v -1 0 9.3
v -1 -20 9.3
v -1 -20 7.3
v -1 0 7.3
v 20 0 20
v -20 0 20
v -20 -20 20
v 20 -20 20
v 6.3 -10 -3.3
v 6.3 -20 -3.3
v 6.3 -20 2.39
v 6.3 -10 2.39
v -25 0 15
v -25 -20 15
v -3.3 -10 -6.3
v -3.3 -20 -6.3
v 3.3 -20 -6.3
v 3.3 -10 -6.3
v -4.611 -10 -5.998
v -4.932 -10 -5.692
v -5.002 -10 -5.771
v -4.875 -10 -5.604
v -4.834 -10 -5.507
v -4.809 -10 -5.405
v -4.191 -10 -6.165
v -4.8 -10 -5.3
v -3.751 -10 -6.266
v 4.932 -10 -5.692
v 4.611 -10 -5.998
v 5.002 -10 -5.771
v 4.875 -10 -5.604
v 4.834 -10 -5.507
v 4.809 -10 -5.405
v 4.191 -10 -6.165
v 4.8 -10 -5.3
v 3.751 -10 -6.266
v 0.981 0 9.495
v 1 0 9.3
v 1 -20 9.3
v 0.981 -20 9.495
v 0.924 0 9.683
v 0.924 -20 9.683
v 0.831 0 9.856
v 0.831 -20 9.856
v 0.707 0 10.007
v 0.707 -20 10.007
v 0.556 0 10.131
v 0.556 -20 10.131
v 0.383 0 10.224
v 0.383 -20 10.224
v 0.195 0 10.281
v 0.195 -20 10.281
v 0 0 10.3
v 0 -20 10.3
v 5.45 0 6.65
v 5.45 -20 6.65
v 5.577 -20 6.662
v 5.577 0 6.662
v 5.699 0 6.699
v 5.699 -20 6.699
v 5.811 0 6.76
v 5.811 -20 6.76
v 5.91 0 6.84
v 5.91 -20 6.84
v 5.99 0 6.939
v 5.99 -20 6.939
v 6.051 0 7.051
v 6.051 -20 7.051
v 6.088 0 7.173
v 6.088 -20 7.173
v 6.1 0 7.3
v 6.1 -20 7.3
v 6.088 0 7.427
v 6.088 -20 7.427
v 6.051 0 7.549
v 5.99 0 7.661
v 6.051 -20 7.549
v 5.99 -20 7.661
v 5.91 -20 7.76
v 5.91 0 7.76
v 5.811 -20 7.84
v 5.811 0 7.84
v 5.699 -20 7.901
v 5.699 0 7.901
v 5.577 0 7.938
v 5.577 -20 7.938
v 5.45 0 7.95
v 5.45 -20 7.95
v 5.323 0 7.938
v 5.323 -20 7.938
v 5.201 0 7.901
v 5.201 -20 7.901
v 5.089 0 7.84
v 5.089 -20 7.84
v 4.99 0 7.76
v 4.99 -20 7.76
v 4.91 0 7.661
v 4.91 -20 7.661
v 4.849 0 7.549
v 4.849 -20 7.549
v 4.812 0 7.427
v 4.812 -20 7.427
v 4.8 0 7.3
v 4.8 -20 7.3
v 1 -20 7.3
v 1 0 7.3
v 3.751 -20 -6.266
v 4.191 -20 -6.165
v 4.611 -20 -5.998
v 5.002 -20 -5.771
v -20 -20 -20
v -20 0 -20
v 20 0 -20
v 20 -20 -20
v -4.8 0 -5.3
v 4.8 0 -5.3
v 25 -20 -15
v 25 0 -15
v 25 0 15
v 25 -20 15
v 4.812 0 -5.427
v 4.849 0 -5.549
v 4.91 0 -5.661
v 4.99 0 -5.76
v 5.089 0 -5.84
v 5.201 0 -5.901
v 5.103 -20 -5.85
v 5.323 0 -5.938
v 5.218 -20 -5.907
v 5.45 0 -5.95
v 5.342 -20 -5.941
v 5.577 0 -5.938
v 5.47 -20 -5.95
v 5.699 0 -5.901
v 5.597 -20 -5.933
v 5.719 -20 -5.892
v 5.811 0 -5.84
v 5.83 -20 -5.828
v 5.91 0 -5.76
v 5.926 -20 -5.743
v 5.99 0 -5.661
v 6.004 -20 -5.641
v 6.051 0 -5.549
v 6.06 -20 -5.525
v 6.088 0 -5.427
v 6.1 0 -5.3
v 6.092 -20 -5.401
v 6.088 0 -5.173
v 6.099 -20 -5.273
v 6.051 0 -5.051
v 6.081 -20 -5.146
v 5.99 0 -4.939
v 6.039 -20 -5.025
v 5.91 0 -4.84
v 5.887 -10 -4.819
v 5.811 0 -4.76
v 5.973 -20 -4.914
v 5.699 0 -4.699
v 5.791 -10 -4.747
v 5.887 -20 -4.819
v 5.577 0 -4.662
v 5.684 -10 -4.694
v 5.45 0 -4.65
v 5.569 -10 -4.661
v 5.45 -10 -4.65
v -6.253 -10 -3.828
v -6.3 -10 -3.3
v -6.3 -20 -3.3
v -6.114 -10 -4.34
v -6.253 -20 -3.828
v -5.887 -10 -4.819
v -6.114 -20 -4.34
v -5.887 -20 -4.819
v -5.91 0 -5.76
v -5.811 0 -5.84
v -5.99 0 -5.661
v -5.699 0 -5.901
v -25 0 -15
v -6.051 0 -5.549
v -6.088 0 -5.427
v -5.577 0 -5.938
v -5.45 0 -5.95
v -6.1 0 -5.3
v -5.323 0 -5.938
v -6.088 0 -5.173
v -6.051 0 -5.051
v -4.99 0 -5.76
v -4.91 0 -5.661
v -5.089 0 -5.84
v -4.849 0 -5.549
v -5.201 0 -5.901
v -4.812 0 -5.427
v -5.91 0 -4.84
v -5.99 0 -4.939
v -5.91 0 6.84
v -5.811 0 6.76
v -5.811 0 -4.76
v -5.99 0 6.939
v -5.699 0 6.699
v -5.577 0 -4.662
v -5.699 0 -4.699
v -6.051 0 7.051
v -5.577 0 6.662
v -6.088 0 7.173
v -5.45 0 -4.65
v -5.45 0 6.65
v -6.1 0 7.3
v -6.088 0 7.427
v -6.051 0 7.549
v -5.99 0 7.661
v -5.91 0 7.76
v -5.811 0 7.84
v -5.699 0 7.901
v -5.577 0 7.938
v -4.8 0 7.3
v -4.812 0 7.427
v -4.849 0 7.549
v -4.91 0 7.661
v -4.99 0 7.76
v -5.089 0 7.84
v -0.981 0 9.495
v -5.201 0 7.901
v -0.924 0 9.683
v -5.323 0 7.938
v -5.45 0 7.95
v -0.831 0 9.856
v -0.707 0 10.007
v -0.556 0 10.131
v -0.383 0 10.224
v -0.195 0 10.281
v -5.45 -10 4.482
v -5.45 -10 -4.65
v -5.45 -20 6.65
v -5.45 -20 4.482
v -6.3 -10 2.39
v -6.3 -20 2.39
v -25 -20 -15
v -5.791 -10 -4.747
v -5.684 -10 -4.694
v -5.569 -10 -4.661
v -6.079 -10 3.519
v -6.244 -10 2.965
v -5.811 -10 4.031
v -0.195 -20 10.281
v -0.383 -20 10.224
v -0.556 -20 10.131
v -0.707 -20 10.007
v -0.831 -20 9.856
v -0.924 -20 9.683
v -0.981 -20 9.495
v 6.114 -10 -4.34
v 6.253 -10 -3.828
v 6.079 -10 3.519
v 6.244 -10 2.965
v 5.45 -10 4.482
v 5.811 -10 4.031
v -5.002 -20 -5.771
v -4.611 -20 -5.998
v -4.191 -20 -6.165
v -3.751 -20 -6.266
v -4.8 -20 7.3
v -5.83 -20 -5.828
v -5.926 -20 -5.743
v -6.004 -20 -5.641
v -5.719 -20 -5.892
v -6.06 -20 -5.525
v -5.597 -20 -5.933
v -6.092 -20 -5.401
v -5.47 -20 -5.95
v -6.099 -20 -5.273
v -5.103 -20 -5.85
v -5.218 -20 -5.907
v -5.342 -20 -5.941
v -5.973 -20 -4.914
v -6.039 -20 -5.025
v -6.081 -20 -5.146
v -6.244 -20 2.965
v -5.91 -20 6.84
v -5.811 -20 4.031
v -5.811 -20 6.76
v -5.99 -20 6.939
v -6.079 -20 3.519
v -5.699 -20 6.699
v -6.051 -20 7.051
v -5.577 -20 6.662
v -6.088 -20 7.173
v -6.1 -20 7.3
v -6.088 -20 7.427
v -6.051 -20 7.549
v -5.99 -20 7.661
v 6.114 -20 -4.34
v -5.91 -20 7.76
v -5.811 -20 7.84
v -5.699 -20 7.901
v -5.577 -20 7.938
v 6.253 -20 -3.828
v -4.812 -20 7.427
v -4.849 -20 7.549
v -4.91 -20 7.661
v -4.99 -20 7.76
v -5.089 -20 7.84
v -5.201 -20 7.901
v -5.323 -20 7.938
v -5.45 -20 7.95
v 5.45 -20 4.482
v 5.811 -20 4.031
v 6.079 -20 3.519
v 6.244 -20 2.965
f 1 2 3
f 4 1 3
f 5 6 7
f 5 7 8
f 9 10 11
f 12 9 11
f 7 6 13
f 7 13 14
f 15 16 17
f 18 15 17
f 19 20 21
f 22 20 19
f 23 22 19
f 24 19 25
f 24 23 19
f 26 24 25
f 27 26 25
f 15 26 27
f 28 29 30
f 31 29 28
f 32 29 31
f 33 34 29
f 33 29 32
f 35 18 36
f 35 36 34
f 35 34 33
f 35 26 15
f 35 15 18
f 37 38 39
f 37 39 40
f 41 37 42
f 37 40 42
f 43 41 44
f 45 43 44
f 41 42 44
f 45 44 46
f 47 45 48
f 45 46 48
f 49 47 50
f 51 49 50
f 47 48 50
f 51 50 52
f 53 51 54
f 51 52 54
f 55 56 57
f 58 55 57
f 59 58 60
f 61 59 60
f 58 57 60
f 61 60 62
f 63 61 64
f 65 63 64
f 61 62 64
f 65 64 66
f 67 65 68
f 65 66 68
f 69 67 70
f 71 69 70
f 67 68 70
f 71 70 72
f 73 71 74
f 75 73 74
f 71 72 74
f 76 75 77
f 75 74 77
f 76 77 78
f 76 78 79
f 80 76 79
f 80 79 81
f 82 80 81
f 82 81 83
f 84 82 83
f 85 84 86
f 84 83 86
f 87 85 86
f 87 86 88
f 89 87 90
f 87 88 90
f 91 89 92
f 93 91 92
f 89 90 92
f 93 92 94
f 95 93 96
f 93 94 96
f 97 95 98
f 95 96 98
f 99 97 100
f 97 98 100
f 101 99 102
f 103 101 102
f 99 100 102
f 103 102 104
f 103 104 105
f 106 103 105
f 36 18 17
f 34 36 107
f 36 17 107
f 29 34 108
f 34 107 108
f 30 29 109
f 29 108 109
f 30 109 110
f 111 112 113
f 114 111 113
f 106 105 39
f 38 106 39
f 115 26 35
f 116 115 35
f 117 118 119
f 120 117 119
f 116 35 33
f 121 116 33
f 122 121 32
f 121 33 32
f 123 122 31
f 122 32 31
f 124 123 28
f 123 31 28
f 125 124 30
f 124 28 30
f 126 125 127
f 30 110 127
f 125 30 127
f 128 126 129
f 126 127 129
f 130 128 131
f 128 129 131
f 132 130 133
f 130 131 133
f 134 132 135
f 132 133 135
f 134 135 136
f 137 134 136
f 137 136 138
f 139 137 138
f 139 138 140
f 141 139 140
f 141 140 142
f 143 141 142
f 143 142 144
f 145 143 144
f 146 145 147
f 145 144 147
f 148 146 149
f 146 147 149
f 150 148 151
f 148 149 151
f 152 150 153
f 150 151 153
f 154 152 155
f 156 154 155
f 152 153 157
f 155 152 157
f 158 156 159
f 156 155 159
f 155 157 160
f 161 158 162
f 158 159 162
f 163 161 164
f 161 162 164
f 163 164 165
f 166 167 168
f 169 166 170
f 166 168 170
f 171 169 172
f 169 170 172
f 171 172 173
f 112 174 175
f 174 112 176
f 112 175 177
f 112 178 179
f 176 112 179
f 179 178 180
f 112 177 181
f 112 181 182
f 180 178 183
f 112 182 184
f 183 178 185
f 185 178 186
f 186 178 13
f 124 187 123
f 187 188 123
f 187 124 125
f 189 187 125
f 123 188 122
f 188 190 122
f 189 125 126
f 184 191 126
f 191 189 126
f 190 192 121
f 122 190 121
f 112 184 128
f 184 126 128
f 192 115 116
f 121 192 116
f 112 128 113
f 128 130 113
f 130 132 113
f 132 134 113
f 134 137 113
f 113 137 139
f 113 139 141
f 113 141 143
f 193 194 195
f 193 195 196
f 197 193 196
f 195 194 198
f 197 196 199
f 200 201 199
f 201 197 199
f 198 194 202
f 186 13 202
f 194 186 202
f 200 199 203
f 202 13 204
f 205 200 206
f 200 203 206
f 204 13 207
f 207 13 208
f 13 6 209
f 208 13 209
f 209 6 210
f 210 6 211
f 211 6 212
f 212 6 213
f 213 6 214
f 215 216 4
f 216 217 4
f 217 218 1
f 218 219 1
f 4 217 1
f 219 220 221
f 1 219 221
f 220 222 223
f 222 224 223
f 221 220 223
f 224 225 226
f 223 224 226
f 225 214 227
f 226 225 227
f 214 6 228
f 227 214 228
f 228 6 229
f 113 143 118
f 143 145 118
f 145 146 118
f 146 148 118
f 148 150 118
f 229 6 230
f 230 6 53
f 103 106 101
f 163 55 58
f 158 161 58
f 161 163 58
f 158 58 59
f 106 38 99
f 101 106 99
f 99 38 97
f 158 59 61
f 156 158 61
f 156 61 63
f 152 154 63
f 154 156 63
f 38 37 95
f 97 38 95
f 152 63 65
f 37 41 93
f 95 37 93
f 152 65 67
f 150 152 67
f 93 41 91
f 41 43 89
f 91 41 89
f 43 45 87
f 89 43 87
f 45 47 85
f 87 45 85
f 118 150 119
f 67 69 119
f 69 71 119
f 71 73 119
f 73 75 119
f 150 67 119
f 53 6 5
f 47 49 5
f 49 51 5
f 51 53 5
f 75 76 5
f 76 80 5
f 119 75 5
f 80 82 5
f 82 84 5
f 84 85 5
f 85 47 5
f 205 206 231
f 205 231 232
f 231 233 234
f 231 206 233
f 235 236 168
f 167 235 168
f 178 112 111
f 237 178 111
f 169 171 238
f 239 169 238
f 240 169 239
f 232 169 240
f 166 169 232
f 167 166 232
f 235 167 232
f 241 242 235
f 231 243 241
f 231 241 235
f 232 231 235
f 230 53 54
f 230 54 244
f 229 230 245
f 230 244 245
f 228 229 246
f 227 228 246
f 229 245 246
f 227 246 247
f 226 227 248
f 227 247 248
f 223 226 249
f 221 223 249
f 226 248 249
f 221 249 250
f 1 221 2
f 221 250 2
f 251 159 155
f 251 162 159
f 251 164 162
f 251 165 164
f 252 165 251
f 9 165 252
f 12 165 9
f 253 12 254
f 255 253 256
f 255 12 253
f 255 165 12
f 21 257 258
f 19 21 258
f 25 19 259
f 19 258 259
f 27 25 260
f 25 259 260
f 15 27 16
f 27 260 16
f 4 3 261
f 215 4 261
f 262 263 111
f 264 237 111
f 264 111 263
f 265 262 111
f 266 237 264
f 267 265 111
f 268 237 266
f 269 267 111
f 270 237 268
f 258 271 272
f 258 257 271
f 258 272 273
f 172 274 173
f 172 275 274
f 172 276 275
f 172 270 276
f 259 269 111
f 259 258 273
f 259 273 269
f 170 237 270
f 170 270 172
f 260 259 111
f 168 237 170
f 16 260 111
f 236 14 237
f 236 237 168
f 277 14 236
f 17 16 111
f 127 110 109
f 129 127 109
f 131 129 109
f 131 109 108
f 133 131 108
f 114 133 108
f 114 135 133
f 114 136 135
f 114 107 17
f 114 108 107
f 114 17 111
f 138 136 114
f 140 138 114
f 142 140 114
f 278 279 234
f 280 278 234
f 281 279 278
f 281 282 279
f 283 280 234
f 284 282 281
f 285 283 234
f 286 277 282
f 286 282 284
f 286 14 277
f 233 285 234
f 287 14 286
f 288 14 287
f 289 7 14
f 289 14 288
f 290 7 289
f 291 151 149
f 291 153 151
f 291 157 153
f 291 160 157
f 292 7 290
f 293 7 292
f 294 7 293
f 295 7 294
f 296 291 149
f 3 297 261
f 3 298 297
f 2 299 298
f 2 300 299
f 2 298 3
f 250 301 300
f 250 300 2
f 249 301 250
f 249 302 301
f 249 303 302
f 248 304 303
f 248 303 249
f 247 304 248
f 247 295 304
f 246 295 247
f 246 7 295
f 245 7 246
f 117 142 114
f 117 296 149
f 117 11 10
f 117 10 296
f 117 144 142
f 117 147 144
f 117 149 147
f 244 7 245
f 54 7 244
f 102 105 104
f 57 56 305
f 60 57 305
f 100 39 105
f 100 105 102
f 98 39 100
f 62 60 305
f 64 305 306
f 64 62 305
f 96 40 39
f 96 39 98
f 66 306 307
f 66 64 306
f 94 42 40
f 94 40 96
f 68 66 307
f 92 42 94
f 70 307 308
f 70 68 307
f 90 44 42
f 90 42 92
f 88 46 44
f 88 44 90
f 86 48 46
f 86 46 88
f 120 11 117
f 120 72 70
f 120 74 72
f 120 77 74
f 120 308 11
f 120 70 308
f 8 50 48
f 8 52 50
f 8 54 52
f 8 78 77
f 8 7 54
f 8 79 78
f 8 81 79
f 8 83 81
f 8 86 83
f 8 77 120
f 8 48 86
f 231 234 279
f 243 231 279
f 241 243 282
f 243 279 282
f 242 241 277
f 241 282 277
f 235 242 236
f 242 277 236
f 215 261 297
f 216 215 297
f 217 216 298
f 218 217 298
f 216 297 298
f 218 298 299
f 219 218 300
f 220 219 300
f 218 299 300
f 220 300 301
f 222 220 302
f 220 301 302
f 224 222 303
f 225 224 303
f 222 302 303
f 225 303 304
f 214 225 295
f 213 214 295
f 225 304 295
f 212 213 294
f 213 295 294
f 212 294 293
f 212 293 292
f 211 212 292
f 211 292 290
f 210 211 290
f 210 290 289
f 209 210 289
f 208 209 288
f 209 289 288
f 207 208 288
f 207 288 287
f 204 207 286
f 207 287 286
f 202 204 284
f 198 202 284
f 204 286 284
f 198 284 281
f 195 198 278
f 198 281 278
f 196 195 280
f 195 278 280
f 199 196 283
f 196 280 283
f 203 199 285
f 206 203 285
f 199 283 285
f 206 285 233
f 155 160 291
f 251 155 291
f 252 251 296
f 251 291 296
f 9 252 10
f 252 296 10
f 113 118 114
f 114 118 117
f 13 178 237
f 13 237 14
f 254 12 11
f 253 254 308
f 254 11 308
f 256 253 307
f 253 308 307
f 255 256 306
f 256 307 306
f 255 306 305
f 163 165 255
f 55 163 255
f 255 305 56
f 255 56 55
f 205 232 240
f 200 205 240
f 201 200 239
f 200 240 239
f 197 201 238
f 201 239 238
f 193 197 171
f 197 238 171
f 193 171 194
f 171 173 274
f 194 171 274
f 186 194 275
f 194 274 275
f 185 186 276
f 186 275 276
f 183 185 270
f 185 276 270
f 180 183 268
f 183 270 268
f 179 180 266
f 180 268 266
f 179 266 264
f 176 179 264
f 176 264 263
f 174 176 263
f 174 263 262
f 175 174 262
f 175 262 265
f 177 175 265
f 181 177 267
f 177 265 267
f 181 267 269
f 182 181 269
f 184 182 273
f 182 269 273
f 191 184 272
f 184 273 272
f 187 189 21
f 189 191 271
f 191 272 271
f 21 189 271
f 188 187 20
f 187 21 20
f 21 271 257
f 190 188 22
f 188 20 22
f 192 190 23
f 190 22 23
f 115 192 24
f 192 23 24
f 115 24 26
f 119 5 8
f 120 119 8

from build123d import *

# Parameters (mm, degrees)
F0_W     = 50
F0_H     = 40
F1_DEPTH = 20
F2_SIZE  = 5
F4_DEPTH = 20
F6_DEPTH = 10


with BuildPart() as f1:
    # F0 (on Front) → F1 (new body)
    with BuildSketch(Plane.XZ):
        Rectangle(F0_W, F0_H)
    extrude(amount=F1_DEPTH)

    # F2
    f2_edges = [f1.edges().sort_by_distance(p)[0] for p in [
        (-25, -10, 20),
        (25, -10, 20),
        (-25, -10, -20),
        (25, -10, -20),
    ]]
    chamfer(f2_edges, length=F2_SIZE)

    # F3 (on face) → F4 (cut)
    with BuildSketch(Plane.XZ.offset(20)):
        with BuildLine():
            Line((-1, 7.3), (-4.8, 7.3))
            ThreePointArc((-4.8, 7.3), (-5.909619, 7.759619), (-5.45, 6.65))
            Line((-5.45, 6.65), (-5.45, -4.65))
            ThreePointArc((-5.45, -4.65), (-5.909619, -5.759619), (-4.8, -5.3))
            Line((-4.8, -5.3), (4.8, -5.3))
            ThreePointArc((4.8, -5.3), (5.909619, -5.759619), (5.45, -4.65))
            Line((5.45, -4.65), (5.45, 6.65))
            ThreePointArc((5.45, 6.65), (5.909619, 7.759619), (4.8, 7.3))
            Line((4.8, 7.3), (1, 7.3))
            Line((1, 7.3), (1, 9.3))
            ThreePointArc((1, 9.3), (0.707107, 10.007107), (0, 10.3))
            ThreePointArc((0, 10.3), (-0.707107, 10.007107), (-1, 9.3))
            Line((-1, 9.3), (-1, 7.3))
        make_face()
    extrude(amount=-F4_DEPTH, mode=Mode.SUBTRACT)

    # F5 (on face) → F6 (cut)
    with BuildSketch(Plane.XZ.offset(20)):
        with BuildLine():
            ThreePointArc((-6.3, -3.3), (-5.42132, -5.42132), (-3.3, -6.3))
            Line((-3.3, -6.3), (3.3, -6.3))
            ThreePointArc((3.3, -6.3), (5.42132, -5.42132), (6.3, -3.3))
            Line((6.3, -3.3), (6.3, 2.39))
            ThreePointArc((6.3, 2.39), (5.42132, 4.51132), (3.3, 5.39))
            Line((3.3, 5.39), (-3.3, 5.39))
            ThreePointArc((-3.3, 5.39), (-5.42132, 4.51132), (-6.3, 2.39))
            Line((-6.3, 2.39), (-6.3, -3.3))
        make_face()
    extrude(amount=-F6_DEPTH, mode=Mode.SUBTRACT)


solid = f1.part
